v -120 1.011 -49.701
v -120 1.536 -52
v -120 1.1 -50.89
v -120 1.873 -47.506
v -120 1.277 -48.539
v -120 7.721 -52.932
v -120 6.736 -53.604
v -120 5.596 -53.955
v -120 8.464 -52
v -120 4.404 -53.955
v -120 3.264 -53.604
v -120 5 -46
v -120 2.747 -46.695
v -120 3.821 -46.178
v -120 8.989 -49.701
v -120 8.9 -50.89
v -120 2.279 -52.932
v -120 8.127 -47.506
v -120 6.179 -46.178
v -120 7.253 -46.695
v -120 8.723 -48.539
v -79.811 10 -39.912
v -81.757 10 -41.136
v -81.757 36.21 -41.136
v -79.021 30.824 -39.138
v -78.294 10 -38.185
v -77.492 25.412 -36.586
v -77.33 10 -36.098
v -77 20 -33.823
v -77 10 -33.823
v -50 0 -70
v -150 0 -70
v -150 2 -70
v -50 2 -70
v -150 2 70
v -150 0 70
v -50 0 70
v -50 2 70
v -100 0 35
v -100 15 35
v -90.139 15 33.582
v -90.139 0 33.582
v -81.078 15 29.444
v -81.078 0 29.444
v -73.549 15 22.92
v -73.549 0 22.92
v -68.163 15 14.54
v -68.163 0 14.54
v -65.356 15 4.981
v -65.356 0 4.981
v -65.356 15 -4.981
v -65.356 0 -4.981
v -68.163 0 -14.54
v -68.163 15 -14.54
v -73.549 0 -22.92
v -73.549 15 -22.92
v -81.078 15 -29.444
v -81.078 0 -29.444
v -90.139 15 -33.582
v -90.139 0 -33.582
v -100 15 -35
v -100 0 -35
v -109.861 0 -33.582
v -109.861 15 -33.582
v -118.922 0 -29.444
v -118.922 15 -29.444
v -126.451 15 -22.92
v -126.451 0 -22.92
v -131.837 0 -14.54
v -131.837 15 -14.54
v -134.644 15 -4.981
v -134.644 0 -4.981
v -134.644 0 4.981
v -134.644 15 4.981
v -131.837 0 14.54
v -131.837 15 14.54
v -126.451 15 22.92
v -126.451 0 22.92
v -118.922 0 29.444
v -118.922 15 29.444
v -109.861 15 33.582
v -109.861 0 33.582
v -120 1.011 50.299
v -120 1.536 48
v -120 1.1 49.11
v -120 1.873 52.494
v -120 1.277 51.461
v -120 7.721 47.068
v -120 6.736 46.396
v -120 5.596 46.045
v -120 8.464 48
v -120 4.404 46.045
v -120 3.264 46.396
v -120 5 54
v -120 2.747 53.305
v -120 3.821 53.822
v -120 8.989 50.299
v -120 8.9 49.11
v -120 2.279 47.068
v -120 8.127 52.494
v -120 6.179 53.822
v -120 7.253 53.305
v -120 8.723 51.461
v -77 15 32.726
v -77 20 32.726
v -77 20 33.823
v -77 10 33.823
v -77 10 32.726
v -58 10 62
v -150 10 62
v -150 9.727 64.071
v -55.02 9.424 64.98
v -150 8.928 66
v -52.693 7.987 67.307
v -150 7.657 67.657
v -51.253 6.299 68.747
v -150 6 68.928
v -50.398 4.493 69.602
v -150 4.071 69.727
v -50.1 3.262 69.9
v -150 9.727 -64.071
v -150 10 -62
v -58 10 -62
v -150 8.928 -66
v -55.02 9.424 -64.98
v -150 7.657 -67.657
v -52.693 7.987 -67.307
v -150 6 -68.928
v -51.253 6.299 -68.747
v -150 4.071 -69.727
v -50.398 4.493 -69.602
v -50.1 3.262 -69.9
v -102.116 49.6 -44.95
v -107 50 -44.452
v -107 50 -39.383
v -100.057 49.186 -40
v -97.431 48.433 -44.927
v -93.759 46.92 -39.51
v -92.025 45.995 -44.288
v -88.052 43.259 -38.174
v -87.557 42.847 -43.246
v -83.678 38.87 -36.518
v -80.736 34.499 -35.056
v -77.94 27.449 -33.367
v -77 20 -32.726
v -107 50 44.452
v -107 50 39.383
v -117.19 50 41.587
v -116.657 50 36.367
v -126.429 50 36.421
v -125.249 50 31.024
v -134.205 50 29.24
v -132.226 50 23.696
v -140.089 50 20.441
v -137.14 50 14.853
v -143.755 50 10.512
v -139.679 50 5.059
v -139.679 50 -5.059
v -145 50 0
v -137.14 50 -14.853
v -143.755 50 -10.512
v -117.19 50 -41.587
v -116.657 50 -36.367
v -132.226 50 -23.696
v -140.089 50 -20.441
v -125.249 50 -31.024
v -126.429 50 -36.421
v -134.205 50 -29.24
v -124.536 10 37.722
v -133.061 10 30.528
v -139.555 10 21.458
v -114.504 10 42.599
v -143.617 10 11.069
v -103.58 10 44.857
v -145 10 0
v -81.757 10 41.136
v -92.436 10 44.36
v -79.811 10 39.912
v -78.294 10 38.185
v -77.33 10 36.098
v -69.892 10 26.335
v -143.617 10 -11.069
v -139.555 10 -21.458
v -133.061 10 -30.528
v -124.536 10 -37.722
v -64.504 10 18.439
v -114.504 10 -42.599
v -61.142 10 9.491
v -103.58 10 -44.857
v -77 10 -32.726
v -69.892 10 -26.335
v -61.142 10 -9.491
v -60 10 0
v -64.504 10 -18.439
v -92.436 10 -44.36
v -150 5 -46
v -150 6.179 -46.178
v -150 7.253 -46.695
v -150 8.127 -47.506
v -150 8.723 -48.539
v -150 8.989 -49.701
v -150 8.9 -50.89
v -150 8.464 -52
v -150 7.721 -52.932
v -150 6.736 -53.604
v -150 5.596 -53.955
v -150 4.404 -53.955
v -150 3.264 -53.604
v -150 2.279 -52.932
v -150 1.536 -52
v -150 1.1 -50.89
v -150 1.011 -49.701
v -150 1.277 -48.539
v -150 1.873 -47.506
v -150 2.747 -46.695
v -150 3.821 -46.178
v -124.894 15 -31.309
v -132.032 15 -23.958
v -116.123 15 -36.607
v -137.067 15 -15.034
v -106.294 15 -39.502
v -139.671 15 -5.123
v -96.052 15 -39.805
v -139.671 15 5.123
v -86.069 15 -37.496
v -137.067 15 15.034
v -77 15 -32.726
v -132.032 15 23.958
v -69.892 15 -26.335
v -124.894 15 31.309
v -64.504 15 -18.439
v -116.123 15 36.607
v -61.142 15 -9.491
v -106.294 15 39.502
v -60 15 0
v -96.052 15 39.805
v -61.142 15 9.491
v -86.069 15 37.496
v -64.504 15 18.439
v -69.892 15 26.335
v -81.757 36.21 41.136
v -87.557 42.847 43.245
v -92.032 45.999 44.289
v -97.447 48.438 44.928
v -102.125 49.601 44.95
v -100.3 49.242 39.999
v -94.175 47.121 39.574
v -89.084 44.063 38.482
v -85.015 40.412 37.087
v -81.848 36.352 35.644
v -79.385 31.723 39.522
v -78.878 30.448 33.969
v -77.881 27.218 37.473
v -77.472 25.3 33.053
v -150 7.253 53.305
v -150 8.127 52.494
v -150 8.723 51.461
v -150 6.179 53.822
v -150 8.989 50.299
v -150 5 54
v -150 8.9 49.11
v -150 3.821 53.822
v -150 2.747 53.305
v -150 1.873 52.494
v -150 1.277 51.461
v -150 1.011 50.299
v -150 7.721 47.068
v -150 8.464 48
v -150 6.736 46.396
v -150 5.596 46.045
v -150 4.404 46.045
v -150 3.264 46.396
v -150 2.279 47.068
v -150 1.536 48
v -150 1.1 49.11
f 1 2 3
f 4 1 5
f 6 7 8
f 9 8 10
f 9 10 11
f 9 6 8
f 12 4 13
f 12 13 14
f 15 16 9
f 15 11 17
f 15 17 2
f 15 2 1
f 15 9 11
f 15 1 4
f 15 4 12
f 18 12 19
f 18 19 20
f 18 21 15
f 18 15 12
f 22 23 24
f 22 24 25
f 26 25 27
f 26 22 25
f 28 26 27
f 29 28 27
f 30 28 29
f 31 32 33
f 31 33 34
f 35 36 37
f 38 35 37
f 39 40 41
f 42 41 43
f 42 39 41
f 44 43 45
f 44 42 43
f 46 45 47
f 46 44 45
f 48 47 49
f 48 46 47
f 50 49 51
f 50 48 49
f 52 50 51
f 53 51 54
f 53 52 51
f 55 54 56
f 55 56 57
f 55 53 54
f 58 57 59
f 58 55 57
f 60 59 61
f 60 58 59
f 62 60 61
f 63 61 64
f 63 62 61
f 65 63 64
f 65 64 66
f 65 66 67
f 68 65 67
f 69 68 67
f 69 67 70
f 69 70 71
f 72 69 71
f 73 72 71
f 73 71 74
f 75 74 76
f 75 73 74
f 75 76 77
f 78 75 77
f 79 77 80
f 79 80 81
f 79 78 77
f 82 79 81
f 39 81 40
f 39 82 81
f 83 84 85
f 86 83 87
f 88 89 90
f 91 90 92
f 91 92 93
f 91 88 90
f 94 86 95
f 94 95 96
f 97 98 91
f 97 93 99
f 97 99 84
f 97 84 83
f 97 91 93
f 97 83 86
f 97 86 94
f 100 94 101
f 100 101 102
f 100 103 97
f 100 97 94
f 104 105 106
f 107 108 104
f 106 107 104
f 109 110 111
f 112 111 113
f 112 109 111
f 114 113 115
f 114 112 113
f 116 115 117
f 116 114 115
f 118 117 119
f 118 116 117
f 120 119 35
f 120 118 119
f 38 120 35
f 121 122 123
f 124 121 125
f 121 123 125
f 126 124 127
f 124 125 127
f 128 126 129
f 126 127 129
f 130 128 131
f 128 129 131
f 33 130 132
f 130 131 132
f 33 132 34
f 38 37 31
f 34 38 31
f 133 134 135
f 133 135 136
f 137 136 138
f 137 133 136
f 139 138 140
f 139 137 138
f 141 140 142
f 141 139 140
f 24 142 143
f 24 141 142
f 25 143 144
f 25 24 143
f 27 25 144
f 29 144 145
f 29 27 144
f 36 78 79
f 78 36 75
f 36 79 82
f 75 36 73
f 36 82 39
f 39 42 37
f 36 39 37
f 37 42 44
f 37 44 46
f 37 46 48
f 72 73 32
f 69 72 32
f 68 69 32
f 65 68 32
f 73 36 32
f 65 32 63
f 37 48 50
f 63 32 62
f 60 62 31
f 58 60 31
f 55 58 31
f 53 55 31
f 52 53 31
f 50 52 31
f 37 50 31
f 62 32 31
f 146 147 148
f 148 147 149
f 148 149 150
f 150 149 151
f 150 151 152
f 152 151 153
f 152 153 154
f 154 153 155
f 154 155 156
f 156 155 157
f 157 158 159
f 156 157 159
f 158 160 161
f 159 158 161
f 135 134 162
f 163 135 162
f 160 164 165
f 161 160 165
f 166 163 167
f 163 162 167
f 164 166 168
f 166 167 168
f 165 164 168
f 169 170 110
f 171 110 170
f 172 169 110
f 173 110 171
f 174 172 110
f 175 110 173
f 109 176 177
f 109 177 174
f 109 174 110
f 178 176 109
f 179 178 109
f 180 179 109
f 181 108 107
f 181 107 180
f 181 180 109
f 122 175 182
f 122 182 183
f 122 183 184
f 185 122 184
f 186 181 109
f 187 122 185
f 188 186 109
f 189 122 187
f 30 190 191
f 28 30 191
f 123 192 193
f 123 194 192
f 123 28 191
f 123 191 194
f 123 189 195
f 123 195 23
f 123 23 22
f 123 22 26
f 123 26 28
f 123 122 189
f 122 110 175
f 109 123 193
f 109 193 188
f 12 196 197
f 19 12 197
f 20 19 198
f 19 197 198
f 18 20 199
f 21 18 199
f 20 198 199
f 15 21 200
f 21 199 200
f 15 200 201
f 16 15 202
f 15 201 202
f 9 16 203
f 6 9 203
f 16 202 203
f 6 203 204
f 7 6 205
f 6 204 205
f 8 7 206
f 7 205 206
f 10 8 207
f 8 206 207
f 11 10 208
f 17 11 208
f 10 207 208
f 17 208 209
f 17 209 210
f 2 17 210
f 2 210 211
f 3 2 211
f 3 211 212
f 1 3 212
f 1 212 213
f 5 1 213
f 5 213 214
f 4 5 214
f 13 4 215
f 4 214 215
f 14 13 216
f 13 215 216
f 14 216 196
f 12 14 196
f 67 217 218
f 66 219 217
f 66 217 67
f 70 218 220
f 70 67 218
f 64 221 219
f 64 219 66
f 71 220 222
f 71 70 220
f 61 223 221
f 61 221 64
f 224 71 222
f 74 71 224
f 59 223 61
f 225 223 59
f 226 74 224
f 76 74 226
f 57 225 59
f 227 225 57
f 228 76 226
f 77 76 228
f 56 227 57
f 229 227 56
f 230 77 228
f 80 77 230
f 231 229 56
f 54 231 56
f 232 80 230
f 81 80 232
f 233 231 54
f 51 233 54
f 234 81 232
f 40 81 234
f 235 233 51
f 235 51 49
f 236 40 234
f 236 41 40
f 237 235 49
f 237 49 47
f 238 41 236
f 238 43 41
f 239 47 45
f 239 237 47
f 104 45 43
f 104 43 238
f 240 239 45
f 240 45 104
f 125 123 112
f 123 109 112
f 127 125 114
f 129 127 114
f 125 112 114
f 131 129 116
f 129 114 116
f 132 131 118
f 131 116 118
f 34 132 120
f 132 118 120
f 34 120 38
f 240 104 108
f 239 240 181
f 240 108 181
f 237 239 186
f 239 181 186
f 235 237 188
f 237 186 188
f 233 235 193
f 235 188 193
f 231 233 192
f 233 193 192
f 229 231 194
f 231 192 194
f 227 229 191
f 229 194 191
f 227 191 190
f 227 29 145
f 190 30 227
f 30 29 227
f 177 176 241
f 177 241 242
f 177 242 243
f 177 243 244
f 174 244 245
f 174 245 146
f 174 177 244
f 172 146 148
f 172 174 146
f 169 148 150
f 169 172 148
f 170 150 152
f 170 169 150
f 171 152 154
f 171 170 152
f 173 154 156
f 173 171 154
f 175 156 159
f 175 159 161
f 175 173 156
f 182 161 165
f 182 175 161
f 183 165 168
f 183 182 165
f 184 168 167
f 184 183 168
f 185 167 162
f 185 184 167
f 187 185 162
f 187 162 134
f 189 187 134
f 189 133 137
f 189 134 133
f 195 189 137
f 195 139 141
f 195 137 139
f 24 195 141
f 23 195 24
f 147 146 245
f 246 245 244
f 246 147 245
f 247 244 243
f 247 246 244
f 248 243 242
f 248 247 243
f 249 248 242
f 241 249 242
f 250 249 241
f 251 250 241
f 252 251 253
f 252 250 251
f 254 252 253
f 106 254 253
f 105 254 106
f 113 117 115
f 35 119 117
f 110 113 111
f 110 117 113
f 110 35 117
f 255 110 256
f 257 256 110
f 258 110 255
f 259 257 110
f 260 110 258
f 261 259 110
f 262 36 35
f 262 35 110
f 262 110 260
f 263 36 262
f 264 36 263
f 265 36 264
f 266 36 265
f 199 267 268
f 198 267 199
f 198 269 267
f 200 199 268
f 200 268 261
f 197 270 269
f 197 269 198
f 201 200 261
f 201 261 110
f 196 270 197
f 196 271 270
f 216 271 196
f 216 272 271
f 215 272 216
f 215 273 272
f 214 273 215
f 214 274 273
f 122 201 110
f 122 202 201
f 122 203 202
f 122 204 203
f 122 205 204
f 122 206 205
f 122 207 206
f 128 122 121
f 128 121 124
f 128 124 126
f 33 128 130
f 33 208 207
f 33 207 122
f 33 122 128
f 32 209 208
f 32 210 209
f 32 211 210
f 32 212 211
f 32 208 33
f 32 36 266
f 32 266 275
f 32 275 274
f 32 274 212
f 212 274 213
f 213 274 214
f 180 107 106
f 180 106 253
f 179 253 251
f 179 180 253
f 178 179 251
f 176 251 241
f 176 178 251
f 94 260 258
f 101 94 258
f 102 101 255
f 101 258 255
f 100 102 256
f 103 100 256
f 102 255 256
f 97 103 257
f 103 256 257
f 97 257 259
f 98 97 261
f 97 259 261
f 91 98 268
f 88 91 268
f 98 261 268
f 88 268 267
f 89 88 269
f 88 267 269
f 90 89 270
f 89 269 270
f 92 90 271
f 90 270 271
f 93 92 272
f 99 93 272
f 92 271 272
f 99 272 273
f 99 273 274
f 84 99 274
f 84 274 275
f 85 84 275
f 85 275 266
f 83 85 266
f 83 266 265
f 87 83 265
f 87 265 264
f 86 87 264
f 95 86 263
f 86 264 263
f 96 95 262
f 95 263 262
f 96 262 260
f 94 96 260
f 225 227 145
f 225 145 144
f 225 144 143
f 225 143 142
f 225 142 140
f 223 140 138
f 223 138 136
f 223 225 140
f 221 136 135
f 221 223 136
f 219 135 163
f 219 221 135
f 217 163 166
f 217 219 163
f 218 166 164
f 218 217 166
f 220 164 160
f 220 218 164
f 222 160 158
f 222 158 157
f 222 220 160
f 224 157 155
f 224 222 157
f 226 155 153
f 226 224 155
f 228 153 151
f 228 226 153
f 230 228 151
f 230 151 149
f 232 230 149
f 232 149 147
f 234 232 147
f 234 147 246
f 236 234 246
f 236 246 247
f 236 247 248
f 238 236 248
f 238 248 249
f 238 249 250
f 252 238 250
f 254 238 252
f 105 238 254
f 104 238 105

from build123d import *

# Parameters (mm, degrees)
CROQUIS3_W                 = 300
CROQUIS3_H                 = 140
SALIENTE_EXTRUIR1_DEPTH    = 10
CROQUIS5_R                 = 40
CROQUIS5_R_2               = 35
SALIENTE_EXTRUIR2_DEPTH    = 5
SALIENTE_EXTRUIR5_DEPTH    = 40
REDONDEO3_START            = -46
REDONDEO3_DEPTH            = 13.273863656
REDONDEO4_START            = -44.452221542
REDONDEO4_DEPTH            = 90.452221542
CORTAR_EXTRUIR1_START      = -40
CROQUIS7_R                 = 35
CORTAR_EXTRUIR1_DEPTH      = 40
MATRIZL1_COUNT             = 3
MATRIZL1_PITCH             = 100
CORTAR_EXTRUIR3_DEPTH      = 171.293863683
CORTAR_EXTRUIR3_DEPTH_BACK = 171.293863683
CROQUIS10_W                = 200
CROQUIS10_H                = 140
CROQUIS12_R                = 4
CORTAR_EXTRUIR4_DEPTH      = 30
REDONDEO5_R                = 8


with BuildPart() as part:
    # Croquis3 → Saliente-Extruir1 (new body)
    with BuildSketch(Plane(origin=(0, 0, 0), x_dir=(1, 0, 0), z_dir=(0, 1, 0))):
        Rectangle(CROQUIS3_W, CROQUIS3_H)
    extrude(amount=SALIENTE_EXTRUIR1_DEPTH)

    # Croquis5 → Saliente-Extruir2 (add)
    # profile 1 of 3: a face of its own
    with BuildSketch(Plane(origin=(0, 10, 0), x_dir=(1, 0, 0), z_dir=(0, 1, 0))):
        with Locations(Location((-100, 0, 0), (0, 0, 270))):
            Circle(CROQUIS5_R)
        with Locations(Location((-100, 0, 0), (0, 0, 270))):
            Circle(CROQUIS5_R_2, mode=Mode.SUBTRACT)
    # profile 2 of 3: a face of its own
    with BuildSketch(Plane(origin=(0, 10, 0), x_dir=(1, 0, 0), z_dir=(0, 1, 0))):
        with Locations(Location((0, 0, 0), (0, 0, 270))):
            Circle(CROQUIS5_R)
        with Locations(Location((0, 0, 0), (0, 0, 270))):
            Circle(CROQUIS5_R_2, mode=Mode.SUBTRACT)
    # profile 3 of 3: a face of its own
    with BuildSketch(Plane(origin=(0, 10, 0), x_dir=(1, 0, 0), z_dir=(0, 1, 0))):
        with Locations(Location((100, 0, 0), (0, 0, 270))):
            Circle(CROQUIS5_R)
        with Locations(Location((100, 0, 0), (0, 0, 270))):
            Circle(CROQUIS5_R_2, mode=Mode.SUBTRACT)
    extrude(amount=SALIENTE_EXTRUIR2_DEPTH)

    # Croquis6 → Saliente-Extruir5 (add)
    with BuildSketch(Plane(origin=(0, 10, 0), x_dir=(1, 0, 0), z_dir=(0, 1, 0))):
        with BuildLine():
            Line((-77, 33.823069051), (-77, 32.726136344))
            ThreePointArc((-77, 32.726136344), (-140, 0), (-77, -32.726136344))
            Line((-77, -32.726136344), (-77, -33.823069051))
            ThreePointArc((-77, -33.823069051), (-78.293810846, -38.185067105), (-81.756756757, -41.136165062))
            ThreePointArc((-81.756756757, -41.136165062), (-145, 0), (-81.756756757, 41.136165062))
            ThreePointArc((-81.756756757, 41.136165062), (-78.293810846, 38.185067105), (-77, 33.823069051))
        make_face()
    saliente_extruir5 = extrude(amount=SALIENTE_EXTRUIR5_DEPTH)

    # Redondeo3: read off the stored shape, not the designer's step
    # Redondeo3 outline → Redondeo3 (cut)
    with BuildSketch(Plane.XY.offset(REDONDEO3_START)):
        with BuildLine():
            ThreePointArc((-107.000000862, 50), (-85.786796869, 41.21320374), (-77, 20))
            Line((-77, 20), (-77, 50))
            Line((-77, 50), (-107.000000862, 50))
        make_face()
    redondeo3 = extrude(amount=REDONDEO3_DEPTH, mode=Mode.SUBTRACT)

    # Redondeo4: read off the stored shape, not the designer's step
    # Redondeo4 outline → Redondeo4 (cut)
    with BuildSketch(Plane.XY.offset(REDONDEO4_START)):
        with BuildLine():
            ThreePointArc((-107.000000862, 50), (-85.786796869, 41.21320374), (-77, 20))
            Line((-77, 20), (-77, 50))
            Line((-77, 50), (-107.000000862, 50))
        make_face()
    redondeo4 = extrude(amount=REDONDEO4_DEPTH, mode=Mode.SUBTRACT)

    # Croquis7 → Cortar-Extruir1 (cut)
    with BuildSketch(Plane(origin=(0, 10, 0), x_dir=(1, 0, 0), z_dir=(0, 1, 0)).offset(CORTAR_EXTRUIR1_START)):
        with Locations(Location((-100, 0, 0), (0, 0, 270))):
            Circle(CROQUIS7_R)
    cortar_extruir1 = extrude(amount=CORTAR_EXTRUIR1_DEPTH, mode=Mode.SUBTRACT)

    # MatrizL1: Saliente-Extruir5, Redondeo3, Redondeo4, Cortar-Extruir1 ×3
    with Locations(*[(i * MATRIZL1_PITCH, 0, 0) for i in range(1, MATRIZL1_COUNT)]):
        add(saliente_extruir5)
        add(redondeo3, mode=Mode.SUBTRACT)
        add(redondeo4, mode=Mode.SUBTRACT)
        add(cortar_extruir1, mode=Mode.SUBTRACT)

    # Croquis10 → Cortar-Extruir3 (cut, two sides: drawn at the far end of the back side and taken through both)
    with BuildSketch(Plane(origin=(0, 10, 0), x_dir=(1, 0, 0), z_dir=(0, 1, 0)).offset(-CORTAR_EXTRUIR3_DEPTH_BACK)):
        with Locations((50, 0)):
            Rectangle(CROQUIS10_W, CROQUIS10_H)
    extrude(amount=CORTAR_EXTRUIR3_DEPTH + CORTAR_EXTRUIR3_DEPTH_BACK, mode=Mode.SUBTRACT)

    # Croquis12 → Cortar-Extruir4 (cut)
    with BuildSketch(Plane.ZY.offset(150)):
        with Locations((-50, 5)):
            Circle(CROQUIS12_R)
        with Locations((50, 5)):
            Circle(CROQUIS12_R)
    extrude(amount=-CORTAR_EXTRUIR4_DEPTH, mode=Mode.SUBTRACT)

    # Redondeo5
    redondeo5_edges = [part.edges().sort_by_distance(p)[0] for p in [
        (-100, 10, -70),
        (-50, 10, 0),
        (-100, 10, 70),
    ]]
    fillet(redondeo5_edges, radius=REDONDEO5_R)


solid = part.part
